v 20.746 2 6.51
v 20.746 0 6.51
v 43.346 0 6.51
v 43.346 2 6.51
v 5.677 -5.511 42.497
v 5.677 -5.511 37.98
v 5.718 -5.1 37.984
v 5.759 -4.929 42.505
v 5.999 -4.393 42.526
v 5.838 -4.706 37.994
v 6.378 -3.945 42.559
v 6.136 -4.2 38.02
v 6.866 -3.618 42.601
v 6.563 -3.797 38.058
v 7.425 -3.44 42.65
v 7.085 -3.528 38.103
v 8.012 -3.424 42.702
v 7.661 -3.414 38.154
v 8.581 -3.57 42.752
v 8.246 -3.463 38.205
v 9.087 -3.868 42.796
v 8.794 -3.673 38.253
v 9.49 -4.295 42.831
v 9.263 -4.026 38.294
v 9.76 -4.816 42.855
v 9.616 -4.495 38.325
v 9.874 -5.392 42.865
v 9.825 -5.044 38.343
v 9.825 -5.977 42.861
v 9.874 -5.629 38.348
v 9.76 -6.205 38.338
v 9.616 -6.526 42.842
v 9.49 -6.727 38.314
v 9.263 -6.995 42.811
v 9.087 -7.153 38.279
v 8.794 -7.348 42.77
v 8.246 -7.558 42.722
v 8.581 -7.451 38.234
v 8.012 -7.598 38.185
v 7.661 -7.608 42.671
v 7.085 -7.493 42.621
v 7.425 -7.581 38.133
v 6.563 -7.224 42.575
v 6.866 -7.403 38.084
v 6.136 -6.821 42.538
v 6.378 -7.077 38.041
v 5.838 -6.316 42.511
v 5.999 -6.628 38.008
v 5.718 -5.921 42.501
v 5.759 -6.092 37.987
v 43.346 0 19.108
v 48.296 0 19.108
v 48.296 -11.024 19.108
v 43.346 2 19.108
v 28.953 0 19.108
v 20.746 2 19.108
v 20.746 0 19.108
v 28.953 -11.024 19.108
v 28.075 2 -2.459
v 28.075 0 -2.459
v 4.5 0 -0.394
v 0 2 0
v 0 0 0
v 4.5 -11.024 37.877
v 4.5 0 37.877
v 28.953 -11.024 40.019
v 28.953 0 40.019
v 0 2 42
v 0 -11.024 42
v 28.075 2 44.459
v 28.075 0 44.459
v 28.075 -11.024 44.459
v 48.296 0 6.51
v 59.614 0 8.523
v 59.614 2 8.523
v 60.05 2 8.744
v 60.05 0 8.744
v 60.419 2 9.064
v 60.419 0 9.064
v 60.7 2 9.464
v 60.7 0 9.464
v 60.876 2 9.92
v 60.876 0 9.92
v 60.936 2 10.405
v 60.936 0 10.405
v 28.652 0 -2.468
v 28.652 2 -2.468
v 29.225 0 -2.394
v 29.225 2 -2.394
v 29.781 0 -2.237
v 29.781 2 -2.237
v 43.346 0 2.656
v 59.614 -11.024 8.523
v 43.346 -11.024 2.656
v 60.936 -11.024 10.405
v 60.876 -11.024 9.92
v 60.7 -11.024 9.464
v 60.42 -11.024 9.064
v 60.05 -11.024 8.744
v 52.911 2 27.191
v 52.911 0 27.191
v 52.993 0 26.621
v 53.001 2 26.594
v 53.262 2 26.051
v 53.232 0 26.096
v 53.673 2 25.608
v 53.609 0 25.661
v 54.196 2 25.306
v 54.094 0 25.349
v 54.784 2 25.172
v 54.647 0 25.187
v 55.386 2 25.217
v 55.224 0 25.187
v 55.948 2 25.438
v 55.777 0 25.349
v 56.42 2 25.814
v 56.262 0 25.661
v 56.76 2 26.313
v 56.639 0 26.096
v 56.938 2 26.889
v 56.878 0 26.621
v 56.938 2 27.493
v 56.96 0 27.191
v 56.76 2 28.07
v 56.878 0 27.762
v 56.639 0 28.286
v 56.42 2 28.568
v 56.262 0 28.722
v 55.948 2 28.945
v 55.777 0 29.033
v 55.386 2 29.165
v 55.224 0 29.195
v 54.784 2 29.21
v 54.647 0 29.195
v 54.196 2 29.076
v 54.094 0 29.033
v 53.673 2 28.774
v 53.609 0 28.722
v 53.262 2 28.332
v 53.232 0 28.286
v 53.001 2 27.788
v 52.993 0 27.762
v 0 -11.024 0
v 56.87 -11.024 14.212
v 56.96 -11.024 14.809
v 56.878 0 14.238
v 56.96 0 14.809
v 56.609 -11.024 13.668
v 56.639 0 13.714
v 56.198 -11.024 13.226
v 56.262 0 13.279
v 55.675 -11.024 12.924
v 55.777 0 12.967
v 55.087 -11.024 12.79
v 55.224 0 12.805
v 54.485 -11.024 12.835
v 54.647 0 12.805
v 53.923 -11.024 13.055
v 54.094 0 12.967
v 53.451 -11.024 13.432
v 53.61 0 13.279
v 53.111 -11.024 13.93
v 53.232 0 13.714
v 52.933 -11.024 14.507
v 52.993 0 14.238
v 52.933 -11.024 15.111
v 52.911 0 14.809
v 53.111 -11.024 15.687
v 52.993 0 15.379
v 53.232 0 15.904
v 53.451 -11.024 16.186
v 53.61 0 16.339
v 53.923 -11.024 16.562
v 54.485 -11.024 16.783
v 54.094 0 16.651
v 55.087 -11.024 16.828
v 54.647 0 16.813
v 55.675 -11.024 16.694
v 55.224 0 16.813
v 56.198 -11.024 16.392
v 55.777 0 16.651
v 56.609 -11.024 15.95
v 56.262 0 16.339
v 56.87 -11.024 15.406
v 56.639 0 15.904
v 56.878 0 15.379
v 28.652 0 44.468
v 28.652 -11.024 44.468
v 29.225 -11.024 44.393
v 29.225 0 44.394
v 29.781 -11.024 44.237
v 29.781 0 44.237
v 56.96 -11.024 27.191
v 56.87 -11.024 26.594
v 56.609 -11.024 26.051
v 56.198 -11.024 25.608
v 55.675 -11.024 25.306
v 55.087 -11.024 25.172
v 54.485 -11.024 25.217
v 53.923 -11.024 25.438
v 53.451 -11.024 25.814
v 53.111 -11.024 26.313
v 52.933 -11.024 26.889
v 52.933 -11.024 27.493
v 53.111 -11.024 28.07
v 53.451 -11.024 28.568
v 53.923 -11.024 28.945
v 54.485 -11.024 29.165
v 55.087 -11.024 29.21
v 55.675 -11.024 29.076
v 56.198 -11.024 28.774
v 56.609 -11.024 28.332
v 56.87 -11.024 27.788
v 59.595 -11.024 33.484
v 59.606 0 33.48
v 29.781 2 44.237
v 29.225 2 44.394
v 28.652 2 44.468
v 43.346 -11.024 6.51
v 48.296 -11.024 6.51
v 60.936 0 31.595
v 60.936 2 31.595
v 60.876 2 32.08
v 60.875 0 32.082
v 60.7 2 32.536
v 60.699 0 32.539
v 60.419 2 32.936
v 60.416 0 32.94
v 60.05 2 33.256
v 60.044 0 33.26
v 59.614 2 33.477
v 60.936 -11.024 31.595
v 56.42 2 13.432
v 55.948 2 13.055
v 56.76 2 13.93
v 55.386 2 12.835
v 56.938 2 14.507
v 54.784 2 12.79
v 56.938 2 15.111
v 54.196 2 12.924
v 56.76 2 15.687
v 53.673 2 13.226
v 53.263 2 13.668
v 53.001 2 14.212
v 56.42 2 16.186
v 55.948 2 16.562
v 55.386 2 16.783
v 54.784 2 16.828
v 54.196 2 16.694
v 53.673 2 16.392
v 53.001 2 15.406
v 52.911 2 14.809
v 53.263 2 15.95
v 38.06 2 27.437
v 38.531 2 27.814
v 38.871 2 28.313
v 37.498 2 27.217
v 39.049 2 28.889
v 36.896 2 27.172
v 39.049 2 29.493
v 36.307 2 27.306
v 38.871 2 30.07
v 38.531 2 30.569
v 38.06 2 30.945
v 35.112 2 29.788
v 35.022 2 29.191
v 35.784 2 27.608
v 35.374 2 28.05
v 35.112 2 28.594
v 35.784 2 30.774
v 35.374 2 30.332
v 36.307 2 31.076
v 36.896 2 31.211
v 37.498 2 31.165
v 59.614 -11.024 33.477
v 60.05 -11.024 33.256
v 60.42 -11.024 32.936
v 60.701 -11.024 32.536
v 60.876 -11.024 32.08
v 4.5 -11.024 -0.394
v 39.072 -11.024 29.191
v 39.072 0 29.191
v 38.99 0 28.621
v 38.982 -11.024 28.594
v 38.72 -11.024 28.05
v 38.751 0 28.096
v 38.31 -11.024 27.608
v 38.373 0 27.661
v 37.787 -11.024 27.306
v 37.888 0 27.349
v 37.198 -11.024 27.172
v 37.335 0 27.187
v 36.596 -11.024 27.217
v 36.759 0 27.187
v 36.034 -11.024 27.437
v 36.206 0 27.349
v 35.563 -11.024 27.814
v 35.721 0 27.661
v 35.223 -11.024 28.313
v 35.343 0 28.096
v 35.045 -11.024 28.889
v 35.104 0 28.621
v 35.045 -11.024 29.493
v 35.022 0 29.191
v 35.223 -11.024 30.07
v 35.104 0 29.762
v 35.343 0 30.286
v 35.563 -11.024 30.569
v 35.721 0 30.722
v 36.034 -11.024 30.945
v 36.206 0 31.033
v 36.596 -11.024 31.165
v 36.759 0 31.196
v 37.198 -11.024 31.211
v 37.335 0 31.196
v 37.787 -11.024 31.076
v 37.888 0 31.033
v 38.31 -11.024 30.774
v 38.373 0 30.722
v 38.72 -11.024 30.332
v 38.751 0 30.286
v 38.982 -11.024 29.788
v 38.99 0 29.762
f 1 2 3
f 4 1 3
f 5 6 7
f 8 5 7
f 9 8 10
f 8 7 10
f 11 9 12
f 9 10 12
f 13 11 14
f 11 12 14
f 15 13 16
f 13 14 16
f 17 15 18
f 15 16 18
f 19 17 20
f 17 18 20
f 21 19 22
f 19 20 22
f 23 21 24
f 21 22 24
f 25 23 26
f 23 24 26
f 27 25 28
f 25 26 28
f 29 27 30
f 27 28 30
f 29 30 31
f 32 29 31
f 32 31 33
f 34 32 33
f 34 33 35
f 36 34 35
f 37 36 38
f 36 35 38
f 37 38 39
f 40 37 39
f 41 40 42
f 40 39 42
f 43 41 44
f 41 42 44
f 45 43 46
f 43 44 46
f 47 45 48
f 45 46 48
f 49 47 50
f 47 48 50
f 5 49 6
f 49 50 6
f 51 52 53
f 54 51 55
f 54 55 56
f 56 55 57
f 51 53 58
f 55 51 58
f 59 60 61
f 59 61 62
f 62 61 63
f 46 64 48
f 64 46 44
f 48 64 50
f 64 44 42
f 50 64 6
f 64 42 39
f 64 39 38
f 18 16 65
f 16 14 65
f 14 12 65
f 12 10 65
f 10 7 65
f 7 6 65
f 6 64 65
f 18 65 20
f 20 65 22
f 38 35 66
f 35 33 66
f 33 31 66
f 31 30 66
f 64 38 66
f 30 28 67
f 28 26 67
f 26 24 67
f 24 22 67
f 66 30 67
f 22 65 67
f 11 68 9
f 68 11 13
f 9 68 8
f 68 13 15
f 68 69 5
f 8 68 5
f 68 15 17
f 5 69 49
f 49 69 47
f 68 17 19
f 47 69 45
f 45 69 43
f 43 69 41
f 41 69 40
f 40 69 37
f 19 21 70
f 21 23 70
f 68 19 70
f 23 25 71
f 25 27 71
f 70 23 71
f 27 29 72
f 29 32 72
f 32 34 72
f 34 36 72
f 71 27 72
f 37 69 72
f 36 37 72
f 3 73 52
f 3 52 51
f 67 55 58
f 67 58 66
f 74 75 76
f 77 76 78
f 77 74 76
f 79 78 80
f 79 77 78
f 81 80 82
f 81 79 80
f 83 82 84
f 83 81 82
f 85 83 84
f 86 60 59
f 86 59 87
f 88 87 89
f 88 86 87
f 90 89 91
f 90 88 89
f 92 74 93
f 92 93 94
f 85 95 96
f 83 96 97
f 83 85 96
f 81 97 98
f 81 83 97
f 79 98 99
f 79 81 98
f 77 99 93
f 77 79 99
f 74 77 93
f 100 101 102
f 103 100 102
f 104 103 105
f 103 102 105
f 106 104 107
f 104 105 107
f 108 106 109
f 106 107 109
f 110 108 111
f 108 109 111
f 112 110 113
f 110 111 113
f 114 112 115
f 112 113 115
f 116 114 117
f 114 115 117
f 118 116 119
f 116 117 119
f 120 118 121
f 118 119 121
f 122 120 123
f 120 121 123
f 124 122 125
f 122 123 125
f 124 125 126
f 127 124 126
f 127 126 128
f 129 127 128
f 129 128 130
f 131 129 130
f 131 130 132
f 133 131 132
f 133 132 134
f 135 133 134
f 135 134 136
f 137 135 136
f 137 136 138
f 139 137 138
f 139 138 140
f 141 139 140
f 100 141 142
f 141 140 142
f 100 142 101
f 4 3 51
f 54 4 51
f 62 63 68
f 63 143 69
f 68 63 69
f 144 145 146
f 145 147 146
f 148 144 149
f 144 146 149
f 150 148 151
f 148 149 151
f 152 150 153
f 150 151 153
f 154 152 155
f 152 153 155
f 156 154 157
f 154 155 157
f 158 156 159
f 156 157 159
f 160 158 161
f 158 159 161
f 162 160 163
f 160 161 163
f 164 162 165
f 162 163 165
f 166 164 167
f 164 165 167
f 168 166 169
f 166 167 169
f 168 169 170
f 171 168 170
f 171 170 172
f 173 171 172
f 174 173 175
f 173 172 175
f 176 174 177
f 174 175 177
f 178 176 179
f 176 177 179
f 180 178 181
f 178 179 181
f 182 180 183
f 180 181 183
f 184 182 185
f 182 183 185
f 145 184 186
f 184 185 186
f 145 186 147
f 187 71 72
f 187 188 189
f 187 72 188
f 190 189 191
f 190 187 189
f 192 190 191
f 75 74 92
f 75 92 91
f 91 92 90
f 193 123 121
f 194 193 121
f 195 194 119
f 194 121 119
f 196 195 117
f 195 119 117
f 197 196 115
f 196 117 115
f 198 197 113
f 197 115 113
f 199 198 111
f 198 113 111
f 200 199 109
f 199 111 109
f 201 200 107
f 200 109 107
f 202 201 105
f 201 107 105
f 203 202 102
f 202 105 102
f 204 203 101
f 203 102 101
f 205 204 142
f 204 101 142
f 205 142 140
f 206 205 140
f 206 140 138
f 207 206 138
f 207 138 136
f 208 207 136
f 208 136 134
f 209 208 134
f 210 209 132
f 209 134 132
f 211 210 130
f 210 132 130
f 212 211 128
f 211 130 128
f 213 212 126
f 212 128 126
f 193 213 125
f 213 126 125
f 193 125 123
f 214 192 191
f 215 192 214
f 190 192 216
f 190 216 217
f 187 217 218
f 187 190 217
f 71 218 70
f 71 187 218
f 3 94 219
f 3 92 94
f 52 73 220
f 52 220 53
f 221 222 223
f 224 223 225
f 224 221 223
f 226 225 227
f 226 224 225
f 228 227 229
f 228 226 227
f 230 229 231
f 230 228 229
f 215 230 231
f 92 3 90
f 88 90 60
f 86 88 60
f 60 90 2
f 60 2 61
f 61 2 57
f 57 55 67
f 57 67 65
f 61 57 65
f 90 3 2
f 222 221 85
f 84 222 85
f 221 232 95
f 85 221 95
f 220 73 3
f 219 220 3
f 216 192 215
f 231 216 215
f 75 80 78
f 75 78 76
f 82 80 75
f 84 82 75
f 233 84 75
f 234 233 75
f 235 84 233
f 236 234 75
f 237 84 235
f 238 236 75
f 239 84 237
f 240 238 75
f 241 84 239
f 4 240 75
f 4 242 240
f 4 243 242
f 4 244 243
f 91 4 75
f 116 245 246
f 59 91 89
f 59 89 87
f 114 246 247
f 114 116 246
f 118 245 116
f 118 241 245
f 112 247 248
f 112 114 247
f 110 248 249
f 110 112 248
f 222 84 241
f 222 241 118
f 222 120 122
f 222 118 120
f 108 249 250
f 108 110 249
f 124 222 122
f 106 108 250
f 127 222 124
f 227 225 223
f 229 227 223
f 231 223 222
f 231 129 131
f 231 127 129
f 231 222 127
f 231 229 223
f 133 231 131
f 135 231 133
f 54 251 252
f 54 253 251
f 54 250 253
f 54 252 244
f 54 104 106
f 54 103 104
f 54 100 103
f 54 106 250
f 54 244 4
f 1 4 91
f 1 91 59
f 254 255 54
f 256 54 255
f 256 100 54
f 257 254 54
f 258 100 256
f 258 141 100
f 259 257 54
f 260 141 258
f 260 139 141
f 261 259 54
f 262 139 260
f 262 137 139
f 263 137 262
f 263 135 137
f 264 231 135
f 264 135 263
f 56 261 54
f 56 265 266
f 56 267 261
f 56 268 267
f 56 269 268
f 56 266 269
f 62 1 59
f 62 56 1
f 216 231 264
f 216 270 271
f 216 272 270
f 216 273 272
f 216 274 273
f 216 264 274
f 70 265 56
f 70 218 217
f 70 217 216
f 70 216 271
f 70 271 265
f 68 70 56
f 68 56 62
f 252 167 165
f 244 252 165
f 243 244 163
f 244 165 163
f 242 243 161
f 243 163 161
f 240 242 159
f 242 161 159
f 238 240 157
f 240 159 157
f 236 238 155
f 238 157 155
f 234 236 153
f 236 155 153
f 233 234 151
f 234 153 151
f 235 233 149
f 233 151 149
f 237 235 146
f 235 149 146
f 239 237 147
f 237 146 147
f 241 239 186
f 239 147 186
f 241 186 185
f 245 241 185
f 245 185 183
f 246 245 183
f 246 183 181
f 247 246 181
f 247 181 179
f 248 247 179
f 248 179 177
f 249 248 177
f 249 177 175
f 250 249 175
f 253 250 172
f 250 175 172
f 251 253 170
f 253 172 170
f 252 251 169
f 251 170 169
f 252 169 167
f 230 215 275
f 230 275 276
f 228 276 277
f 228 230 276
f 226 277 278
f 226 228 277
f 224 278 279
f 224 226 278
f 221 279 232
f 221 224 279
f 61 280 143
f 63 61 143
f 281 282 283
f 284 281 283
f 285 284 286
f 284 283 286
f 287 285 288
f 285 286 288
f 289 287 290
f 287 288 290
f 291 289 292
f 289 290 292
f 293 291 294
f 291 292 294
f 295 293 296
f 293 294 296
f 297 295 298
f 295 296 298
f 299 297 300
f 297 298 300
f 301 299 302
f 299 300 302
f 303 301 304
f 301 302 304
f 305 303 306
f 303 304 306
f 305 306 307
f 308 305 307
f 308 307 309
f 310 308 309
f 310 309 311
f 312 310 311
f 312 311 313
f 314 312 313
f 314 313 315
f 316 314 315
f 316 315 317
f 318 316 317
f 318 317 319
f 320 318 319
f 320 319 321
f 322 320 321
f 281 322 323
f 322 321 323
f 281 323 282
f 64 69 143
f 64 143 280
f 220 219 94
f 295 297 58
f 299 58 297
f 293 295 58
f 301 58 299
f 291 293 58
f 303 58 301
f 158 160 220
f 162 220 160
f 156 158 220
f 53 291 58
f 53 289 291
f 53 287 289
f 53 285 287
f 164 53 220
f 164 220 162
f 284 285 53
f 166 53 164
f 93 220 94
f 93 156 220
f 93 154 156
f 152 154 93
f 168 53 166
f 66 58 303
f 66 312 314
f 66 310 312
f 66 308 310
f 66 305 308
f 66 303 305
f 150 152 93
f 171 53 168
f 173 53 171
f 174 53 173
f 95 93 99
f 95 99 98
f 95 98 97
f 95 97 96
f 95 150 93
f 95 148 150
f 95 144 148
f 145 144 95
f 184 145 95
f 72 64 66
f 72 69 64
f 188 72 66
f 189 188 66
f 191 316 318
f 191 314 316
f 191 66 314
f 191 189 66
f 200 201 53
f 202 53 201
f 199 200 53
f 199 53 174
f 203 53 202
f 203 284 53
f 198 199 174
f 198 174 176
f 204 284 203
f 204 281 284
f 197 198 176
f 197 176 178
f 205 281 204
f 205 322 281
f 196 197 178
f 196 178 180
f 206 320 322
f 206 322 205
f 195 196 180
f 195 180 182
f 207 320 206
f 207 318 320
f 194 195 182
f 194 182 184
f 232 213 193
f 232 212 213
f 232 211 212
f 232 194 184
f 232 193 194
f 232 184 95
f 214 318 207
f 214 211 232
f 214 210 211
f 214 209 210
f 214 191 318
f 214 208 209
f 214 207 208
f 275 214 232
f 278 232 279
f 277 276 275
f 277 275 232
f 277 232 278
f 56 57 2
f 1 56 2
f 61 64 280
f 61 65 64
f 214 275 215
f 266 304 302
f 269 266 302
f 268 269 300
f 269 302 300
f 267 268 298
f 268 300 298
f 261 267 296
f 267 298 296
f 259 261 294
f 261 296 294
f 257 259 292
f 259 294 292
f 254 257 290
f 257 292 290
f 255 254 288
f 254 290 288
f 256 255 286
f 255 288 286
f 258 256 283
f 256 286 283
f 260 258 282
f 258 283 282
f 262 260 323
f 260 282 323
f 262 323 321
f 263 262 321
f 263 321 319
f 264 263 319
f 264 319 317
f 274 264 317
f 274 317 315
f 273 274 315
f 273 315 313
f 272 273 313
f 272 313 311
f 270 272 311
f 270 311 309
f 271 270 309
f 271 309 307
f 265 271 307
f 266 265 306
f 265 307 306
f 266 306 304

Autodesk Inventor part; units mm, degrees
ref_plane "YZ Plane" through (0, 0, 0) normal (1, 0, 0) x (0, 1, 0)
ref_plane "XZ Plane" through (0, 0, 0) normal (0, 1, 0) x (-1, 0, 0)
ref_plane "XY Plane" through (0, 0, 0) normal (0, 0, 1) x (1, 0, 0)
sketch "Szkic1" plane through (0, 0, 0) normal (0, 1, 0) x (-1, 0, 0)
  line L0 (0, 0) -> (0, 42)
  line L1 (-28.0748, -2.4593) -> (0, 0)
  line L2 (-59.6141, 8.5234) -> (-29.7811, -2.2373)
  circle A0 centre (-54.9356, 14.8089) radius 2.0248
  circle A1 centre (-54.9355, 27.1912) radius 2.0249
  circle A2 centre (-37.047, 29.1912) radius 2.025
  line L3 (0, 42) -> (-28.0748, 44.4593)
  line L4 (-29.7811, 44.2372) -> (-59.6141, 33.4766)
  circle A3 centre (-28.4239, 40.4745) radius 4.0001
  circle A4 centre (-58.9355, 31.5953) radius 2
  line L5 (-60.9355, 31.5953) -> (-60.9355, 10.4047)
  circle A5 centre (-58.9355, 10.4047) radius 2
  circle A6 centre (-28.4239, 1.5252) radius 3.9998
  line L6 (-43.3459, 19.1078) -> (-20.7459, 19.1078)
  line L7 (-20.7459, 19.1078) -> (-20.7459, 6.5098)
  line L8 (-20.7459, 6.5098) -> (-43.3459, 6.5098)
  line L9 (-43.3459, 6.5098) -> (-43.3459, 19.1078)
  point P0 (-40, 21)
extrude "Wyciągnięcie proste1" add sketch "Szkic1" along normal blind 2
sketch "Szkic2" plane through (0, 0, 0) normal (0, -1, 0) x (1, 0, 0)
  line L0 (4.5002, 37.877) -> (28.9526, 40.019)
  line L1 (28.9526, 19.1078) -> (28.9526, 40.019)
  line L2 (43.3459, 19.1078) -> (48.2961, 19.1078)
  line L3 (48.2961, 6.5098) -> (48.2961, 19.1078)
  line L4 (43.3461, 2.6556) -> (43.3461, 6.5098)
  line L5 (48.2961, 6.5098) -> (43.3459, 6.5098)
  circle A0 centre (58.9357, 10.4048) radius 2
  line L6 (59.6143, 33.4767) -> (59.5948, 33.4837)
  circle A1 centre (58.9355, 31.5953) radius 2.0002
  line L7 (4.5002, 37.877) -> (4.5002, -0.3941)
  line L8 (28.075, -2.4592) -> (28.052, -2.4572)
  arc A2 (60.9355, 31.5953) -> (59.6141, 33.4766) centre (58.9355, 31.5953) ccw projected
  arc A3 (59.6141, 8.5234) -> (60.9355, 10.4047) centre (58.9355, 10.4047) ccw projected
  circle A4 centre (37.047, 29.1912) radius 2.025 projected
  circle A5 centre (54.9356, 14.8089) radius 2.0248 projected
  circle A6 centre (54.9355, 27.1912) radius 2.0249 projected
  line L9 (0, 42) -> (28.0748, 44.4593) projected
  line L10 (0, 0) -> (0, 42) projected
  line L11 (28.0748, -2.4593) -> (0, 0) projected
  arc A7 (28.0748, -2.4593) -> (29.7811, -2.2372) centre (28.4239, 1.5252) ccw projected
  line L12 (59.6141, 8.5234) -> (29.7811, -2.2372) projected
  arc A8 (59.6141, 8.5234) -> (60.9355, 10.4047) centre (58.9355, 10.4047) ccw projected
  line L13 (60.9355, 31.5953) -> (60.9355, 10.4047) projected
  arc A9 (60.9355, 31.5953) -> (59.6141, 33.4766) centre (58.9355, 31.5953) ccw projected
  line L14 (29.7811, 44.2372) -> (59.6141, 33.4766) projected
  arc A10 (29.7811, 44.2372) -> (28.0748, 44.4593) centre (28.4239, 40.4745) ccw projected
  circle A11 centre (37.047, 29.1912) radius 2.025 projected
  circle A12 centre (54.9356, 14.8089) radius 2.0248 projected
  circle A13 centre (54.9355, 27.1912) radius 2.0249 projected
  line L15 (43.3459, 6.5098) -> (43.3459, 19.1078) projected
  line L16 (20.7459, 6.5098) -> (43.3459, 6.5098) projected
  line L17 (20.7459, 19.1078) -> (20.7459, 6.5098) projected
  line L18 (43.3459, 19.1078) -> (20.7459, 19.1078) projected
  line L19 (4.5002, -0.3941) -> (4.5002, -2.2372)
  line L20 (28.9526, 19.1078) -> (28.9526, 16.8338)
  line L21 (43.3459, 6.5098) -> (42.3677, 6.5098)
  line L22 (43.3459, 6.5098) -> (43.3459, 8.4048)
  line L23 (43.3459, 6.5098) -> (43.3459, 19.1078) projected
  line L24 (43.3459, 19.1078) -> (42.3677, 19.1078)
  line L25 (43.3459, 19.1078) -> (43.3459, 17.9708)
  point P0 (40.0002, 21.0001)
  point P1 (59.6047, 8.52)
  point P2 (60.9355, 10.4349)
  point P3 (60.9355, 31.5648)
  point P4 (59.5854, 33.487)
  point P5 (4.5002, -0.3942)
  point P6 (28.9526, 19.1078)
  point P7 (43.3461, 2.6556)
extrude "Wyciągnięcie proste2" add sketch "Szkic2" along normal blind 11.024 contours L7 L11 L10 L9 A10 L14 A1 L13 A0 L12 L4 L5 L3 L2 L18 L1 L0 | A0 | L6 A1
sketch "Szkic3" plane through (43.3459, 2, 19.1078) normal (0, 0, -1) x (-1, 0, 0)
  circle A0 centre (35.5684, -7.5107) radius 2.1003
  point P0 (43.3459, -2)
extrude "Wyciągnięcie proste3" cut sketch "Szkic3" against normal through all
properties part number "base_edited"
